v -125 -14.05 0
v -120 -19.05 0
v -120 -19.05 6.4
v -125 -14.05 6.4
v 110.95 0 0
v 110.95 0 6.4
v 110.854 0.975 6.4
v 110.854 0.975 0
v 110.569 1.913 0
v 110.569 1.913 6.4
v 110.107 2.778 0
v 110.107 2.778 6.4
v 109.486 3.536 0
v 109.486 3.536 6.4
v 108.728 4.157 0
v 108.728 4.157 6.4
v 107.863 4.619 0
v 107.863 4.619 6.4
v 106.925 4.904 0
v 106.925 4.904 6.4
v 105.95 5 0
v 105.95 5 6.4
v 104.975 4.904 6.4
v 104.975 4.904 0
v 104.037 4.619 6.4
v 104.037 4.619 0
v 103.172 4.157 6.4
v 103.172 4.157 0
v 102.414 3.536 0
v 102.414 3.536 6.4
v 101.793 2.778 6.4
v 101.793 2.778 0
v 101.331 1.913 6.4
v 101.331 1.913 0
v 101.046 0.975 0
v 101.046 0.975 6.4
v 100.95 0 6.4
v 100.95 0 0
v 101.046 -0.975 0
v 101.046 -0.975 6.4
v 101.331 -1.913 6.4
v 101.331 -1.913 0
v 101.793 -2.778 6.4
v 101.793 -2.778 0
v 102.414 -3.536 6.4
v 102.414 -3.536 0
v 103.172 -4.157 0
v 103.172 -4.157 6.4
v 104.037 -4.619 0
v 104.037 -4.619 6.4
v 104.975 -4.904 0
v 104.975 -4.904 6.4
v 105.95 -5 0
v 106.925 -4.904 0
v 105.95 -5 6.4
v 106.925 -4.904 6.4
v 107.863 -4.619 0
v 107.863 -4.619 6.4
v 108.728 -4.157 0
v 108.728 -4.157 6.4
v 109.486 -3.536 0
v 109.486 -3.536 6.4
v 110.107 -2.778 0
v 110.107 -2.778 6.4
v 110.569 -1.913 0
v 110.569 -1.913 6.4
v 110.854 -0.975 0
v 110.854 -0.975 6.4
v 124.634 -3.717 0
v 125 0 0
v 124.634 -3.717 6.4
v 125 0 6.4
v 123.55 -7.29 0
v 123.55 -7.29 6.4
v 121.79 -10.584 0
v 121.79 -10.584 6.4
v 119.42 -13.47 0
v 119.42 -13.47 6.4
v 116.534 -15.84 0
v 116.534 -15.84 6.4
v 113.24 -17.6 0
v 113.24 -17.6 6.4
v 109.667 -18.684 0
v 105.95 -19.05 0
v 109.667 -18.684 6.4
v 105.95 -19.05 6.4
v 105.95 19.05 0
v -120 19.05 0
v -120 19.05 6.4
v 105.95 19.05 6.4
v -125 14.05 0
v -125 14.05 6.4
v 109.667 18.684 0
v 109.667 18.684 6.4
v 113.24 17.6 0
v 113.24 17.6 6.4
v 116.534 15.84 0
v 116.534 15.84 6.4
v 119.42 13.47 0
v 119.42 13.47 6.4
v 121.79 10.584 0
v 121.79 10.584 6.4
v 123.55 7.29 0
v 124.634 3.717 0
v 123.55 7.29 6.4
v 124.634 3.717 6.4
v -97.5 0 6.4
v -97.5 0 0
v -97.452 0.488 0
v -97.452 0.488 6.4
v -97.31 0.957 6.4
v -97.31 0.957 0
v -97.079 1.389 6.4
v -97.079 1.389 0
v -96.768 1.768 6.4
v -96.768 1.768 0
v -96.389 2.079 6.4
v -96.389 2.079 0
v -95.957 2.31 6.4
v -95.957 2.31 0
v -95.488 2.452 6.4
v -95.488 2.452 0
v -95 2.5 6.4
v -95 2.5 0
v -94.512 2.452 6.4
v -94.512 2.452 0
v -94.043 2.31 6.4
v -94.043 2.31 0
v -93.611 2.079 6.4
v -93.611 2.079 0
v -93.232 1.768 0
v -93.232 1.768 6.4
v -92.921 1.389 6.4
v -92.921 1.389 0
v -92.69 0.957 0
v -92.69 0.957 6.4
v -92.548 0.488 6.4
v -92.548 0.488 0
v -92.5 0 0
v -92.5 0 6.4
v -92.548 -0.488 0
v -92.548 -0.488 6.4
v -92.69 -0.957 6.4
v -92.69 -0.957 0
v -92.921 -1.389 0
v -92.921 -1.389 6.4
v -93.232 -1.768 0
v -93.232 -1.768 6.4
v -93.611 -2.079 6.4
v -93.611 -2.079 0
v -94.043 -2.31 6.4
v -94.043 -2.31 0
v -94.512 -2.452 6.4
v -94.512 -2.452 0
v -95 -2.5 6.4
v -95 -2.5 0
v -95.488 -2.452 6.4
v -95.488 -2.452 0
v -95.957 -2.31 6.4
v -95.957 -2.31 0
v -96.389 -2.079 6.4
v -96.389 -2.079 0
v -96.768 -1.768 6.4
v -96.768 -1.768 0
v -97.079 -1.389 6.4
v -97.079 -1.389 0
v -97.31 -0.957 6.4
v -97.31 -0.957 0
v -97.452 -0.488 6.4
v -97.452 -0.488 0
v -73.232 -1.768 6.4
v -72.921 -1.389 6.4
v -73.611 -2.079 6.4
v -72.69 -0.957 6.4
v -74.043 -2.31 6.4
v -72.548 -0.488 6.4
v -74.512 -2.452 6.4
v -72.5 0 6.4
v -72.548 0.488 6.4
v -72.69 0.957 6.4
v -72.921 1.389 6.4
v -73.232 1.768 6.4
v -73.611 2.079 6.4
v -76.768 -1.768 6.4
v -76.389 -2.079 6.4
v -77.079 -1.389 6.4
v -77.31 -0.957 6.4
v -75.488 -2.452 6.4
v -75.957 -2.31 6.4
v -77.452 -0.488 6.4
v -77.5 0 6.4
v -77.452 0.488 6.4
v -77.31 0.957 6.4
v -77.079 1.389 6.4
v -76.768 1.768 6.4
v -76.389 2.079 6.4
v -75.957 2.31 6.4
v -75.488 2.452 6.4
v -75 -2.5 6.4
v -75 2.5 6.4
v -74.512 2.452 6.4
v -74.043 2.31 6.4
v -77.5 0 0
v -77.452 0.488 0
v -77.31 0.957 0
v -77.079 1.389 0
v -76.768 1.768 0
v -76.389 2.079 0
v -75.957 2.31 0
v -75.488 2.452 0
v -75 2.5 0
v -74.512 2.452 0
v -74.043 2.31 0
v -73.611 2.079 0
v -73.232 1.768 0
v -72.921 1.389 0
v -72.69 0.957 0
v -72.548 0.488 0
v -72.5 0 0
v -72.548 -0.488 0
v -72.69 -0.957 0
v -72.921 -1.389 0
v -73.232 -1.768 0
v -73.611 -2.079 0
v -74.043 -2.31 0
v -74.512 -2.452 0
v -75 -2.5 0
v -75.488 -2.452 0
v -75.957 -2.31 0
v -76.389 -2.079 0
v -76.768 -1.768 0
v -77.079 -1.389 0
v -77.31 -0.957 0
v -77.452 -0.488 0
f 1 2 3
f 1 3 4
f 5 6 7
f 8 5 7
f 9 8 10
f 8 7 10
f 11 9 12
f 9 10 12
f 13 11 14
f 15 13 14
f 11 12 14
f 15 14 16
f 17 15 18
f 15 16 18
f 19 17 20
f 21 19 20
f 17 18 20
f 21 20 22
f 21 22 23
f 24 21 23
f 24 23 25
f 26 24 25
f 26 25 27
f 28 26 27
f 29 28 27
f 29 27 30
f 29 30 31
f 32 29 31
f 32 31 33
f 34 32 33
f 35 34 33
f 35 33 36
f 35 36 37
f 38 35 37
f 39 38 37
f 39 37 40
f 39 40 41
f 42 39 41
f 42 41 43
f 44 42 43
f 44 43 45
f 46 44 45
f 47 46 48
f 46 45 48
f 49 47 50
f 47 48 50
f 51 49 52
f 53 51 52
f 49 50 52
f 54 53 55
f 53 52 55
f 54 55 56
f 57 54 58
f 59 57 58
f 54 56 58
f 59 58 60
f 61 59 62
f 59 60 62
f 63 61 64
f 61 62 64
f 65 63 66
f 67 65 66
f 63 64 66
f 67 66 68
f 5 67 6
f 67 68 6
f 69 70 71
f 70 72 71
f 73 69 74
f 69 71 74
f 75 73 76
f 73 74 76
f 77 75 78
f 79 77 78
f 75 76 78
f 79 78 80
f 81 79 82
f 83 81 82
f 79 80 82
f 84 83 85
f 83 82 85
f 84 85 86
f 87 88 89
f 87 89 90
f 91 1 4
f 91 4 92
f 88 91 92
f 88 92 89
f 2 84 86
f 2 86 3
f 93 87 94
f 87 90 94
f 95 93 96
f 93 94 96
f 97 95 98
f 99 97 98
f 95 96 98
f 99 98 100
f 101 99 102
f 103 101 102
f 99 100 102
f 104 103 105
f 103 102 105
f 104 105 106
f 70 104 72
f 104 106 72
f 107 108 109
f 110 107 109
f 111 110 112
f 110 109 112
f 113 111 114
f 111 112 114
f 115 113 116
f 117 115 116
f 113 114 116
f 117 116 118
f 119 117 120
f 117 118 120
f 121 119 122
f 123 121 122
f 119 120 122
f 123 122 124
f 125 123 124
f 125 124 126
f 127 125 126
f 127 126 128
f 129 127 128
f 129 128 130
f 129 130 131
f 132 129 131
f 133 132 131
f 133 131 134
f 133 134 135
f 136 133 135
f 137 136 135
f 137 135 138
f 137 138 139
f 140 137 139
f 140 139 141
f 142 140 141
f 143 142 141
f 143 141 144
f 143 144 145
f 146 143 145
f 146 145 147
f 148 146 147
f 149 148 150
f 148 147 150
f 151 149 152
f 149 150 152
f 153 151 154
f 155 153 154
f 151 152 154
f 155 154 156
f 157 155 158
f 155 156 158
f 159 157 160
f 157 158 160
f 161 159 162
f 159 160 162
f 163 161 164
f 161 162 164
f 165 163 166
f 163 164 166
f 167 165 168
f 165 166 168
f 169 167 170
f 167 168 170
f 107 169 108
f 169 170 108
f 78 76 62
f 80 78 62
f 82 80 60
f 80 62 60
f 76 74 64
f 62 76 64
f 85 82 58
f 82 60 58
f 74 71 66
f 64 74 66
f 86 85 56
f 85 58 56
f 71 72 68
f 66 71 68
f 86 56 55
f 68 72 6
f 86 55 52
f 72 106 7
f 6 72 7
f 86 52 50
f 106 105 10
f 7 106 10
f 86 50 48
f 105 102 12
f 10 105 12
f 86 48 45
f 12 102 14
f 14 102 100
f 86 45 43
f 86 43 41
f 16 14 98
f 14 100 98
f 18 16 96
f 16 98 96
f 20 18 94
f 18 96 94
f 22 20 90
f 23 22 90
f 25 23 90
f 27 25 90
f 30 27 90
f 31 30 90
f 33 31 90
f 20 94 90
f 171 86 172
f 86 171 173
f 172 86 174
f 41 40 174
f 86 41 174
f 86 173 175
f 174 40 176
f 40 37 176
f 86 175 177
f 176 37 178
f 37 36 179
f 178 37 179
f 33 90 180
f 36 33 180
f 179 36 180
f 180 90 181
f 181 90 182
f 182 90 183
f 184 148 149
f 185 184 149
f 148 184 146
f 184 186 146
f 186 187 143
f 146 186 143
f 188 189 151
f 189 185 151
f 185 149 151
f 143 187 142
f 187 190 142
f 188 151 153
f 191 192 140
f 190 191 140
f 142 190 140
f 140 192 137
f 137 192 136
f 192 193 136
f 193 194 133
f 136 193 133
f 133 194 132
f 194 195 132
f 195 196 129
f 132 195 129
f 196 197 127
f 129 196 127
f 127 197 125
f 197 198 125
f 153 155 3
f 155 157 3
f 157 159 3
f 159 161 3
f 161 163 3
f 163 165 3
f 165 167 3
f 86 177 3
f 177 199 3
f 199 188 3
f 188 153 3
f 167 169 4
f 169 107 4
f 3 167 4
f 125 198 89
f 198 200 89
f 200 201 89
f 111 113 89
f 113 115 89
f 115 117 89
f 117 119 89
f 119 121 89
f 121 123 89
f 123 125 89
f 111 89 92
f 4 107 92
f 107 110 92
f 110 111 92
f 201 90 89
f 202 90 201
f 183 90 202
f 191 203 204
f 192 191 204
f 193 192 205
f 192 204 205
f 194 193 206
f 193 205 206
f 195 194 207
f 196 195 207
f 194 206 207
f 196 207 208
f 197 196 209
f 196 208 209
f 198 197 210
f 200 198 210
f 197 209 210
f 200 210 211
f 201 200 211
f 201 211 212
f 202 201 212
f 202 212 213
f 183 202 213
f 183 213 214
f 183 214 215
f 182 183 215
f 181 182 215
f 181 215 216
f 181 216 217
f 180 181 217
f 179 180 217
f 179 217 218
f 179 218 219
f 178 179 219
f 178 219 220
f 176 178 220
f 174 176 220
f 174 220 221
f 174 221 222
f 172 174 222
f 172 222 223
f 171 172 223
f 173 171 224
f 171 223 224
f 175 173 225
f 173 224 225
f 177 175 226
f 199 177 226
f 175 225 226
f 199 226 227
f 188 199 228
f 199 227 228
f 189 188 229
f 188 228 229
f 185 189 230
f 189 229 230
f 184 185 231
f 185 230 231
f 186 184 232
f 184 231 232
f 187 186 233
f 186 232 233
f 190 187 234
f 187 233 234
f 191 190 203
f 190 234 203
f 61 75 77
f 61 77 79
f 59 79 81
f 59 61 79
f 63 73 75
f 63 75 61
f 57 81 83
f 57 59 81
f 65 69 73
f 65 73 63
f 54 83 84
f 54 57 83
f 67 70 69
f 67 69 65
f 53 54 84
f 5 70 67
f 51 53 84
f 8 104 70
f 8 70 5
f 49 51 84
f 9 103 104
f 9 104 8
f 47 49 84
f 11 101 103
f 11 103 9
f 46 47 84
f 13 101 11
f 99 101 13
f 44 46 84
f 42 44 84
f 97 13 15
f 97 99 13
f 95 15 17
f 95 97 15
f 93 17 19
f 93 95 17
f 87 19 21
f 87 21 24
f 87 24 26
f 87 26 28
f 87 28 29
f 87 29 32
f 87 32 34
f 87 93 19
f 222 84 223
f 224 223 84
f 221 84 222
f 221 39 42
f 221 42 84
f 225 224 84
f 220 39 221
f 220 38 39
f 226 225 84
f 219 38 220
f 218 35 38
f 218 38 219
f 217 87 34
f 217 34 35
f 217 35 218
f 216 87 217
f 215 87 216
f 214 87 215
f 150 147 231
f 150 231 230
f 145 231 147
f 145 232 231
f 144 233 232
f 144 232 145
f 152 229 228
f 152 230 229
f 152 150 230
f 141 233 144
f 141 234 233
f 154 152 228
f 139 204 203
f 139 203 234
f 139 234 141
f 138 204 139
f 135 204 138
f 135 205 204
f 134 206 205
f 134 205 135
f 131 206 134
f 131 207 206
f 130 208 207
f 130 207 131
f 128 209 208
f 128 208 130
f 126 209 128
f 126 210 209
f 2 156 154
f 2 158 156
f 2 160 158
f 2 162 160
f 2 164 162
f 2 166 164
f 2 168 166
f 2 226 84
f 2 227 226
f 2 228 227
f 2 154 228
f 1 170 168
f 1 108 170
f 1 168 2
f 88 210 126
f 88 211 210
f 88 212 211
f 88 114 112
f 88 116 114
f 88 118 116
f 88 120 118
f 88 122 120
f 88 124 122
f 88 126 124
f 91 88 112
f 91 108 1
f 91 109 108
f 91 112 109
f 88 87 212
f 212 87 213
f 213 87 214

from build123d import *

# Parameters (mm, degrees)
BOSS_EXTRUDE1_DEPTH   = 6.4
F_5_0MM_DOWEL_HOLE1_D = 5
FILLET1_R             = 19.05
CUT_EXTRUDE1_REACH    = 128.605
SKETCH9_R             = 5


with BuildPart() as part:
    # Sketch1 → Boss-Extrude1 (new body)
    with BuildSketch(Plane.XY):
        Polygon((-120, 19.05), (125, 19.05), (125, -19.05), (-120, -19.05), (-125, -14.05), (-125, 14.05), align=None)
    extrude(amount=BOSS_EXTRUDE1_DEPTH)

    # Ø5.0mm Dowel Hole1 (through all)
    with Locations(Plane.XY.offset(6.4)):
        with Locations((-75, 0), (-95, 0)):
            Hole(F_5_0MM_DOWEL_HOLE1_D / 2)

    # Fillet1
    fillet1_edges = [part.edges().sort_by_distance(p)[0] for p in [
        (125, -19.05, 3.2),
        (125, 19.05, 3.2),
    ]]
    fillet(fillet1_edges, radius=FILLET1_R - 0.0001)  # a hair under: the kernel refuses the full size

    # Sketch9 → Cut-Extrude1 (cut, up to next)
    with BuildSketch(Plane.XY.offset(6.4), mode=Mode.PRIVATE) as cut_extrude1_sk1:
        with Locations((105.95, 0)):
            Circle(SKETCH9_R)
    cut_extrude1_tool1 = extrude(cut_extrude1_sk1.sketch, amount=-CUT_EXTRUDE1_REACH, mode=Mode.PRIVATE) & part.part
    add(cut_extrude1_tool1.solids().sort_by_distance((105.95, 0, 6.4))[0], mode=Mode.SUBTRACT)


solid = part.part
